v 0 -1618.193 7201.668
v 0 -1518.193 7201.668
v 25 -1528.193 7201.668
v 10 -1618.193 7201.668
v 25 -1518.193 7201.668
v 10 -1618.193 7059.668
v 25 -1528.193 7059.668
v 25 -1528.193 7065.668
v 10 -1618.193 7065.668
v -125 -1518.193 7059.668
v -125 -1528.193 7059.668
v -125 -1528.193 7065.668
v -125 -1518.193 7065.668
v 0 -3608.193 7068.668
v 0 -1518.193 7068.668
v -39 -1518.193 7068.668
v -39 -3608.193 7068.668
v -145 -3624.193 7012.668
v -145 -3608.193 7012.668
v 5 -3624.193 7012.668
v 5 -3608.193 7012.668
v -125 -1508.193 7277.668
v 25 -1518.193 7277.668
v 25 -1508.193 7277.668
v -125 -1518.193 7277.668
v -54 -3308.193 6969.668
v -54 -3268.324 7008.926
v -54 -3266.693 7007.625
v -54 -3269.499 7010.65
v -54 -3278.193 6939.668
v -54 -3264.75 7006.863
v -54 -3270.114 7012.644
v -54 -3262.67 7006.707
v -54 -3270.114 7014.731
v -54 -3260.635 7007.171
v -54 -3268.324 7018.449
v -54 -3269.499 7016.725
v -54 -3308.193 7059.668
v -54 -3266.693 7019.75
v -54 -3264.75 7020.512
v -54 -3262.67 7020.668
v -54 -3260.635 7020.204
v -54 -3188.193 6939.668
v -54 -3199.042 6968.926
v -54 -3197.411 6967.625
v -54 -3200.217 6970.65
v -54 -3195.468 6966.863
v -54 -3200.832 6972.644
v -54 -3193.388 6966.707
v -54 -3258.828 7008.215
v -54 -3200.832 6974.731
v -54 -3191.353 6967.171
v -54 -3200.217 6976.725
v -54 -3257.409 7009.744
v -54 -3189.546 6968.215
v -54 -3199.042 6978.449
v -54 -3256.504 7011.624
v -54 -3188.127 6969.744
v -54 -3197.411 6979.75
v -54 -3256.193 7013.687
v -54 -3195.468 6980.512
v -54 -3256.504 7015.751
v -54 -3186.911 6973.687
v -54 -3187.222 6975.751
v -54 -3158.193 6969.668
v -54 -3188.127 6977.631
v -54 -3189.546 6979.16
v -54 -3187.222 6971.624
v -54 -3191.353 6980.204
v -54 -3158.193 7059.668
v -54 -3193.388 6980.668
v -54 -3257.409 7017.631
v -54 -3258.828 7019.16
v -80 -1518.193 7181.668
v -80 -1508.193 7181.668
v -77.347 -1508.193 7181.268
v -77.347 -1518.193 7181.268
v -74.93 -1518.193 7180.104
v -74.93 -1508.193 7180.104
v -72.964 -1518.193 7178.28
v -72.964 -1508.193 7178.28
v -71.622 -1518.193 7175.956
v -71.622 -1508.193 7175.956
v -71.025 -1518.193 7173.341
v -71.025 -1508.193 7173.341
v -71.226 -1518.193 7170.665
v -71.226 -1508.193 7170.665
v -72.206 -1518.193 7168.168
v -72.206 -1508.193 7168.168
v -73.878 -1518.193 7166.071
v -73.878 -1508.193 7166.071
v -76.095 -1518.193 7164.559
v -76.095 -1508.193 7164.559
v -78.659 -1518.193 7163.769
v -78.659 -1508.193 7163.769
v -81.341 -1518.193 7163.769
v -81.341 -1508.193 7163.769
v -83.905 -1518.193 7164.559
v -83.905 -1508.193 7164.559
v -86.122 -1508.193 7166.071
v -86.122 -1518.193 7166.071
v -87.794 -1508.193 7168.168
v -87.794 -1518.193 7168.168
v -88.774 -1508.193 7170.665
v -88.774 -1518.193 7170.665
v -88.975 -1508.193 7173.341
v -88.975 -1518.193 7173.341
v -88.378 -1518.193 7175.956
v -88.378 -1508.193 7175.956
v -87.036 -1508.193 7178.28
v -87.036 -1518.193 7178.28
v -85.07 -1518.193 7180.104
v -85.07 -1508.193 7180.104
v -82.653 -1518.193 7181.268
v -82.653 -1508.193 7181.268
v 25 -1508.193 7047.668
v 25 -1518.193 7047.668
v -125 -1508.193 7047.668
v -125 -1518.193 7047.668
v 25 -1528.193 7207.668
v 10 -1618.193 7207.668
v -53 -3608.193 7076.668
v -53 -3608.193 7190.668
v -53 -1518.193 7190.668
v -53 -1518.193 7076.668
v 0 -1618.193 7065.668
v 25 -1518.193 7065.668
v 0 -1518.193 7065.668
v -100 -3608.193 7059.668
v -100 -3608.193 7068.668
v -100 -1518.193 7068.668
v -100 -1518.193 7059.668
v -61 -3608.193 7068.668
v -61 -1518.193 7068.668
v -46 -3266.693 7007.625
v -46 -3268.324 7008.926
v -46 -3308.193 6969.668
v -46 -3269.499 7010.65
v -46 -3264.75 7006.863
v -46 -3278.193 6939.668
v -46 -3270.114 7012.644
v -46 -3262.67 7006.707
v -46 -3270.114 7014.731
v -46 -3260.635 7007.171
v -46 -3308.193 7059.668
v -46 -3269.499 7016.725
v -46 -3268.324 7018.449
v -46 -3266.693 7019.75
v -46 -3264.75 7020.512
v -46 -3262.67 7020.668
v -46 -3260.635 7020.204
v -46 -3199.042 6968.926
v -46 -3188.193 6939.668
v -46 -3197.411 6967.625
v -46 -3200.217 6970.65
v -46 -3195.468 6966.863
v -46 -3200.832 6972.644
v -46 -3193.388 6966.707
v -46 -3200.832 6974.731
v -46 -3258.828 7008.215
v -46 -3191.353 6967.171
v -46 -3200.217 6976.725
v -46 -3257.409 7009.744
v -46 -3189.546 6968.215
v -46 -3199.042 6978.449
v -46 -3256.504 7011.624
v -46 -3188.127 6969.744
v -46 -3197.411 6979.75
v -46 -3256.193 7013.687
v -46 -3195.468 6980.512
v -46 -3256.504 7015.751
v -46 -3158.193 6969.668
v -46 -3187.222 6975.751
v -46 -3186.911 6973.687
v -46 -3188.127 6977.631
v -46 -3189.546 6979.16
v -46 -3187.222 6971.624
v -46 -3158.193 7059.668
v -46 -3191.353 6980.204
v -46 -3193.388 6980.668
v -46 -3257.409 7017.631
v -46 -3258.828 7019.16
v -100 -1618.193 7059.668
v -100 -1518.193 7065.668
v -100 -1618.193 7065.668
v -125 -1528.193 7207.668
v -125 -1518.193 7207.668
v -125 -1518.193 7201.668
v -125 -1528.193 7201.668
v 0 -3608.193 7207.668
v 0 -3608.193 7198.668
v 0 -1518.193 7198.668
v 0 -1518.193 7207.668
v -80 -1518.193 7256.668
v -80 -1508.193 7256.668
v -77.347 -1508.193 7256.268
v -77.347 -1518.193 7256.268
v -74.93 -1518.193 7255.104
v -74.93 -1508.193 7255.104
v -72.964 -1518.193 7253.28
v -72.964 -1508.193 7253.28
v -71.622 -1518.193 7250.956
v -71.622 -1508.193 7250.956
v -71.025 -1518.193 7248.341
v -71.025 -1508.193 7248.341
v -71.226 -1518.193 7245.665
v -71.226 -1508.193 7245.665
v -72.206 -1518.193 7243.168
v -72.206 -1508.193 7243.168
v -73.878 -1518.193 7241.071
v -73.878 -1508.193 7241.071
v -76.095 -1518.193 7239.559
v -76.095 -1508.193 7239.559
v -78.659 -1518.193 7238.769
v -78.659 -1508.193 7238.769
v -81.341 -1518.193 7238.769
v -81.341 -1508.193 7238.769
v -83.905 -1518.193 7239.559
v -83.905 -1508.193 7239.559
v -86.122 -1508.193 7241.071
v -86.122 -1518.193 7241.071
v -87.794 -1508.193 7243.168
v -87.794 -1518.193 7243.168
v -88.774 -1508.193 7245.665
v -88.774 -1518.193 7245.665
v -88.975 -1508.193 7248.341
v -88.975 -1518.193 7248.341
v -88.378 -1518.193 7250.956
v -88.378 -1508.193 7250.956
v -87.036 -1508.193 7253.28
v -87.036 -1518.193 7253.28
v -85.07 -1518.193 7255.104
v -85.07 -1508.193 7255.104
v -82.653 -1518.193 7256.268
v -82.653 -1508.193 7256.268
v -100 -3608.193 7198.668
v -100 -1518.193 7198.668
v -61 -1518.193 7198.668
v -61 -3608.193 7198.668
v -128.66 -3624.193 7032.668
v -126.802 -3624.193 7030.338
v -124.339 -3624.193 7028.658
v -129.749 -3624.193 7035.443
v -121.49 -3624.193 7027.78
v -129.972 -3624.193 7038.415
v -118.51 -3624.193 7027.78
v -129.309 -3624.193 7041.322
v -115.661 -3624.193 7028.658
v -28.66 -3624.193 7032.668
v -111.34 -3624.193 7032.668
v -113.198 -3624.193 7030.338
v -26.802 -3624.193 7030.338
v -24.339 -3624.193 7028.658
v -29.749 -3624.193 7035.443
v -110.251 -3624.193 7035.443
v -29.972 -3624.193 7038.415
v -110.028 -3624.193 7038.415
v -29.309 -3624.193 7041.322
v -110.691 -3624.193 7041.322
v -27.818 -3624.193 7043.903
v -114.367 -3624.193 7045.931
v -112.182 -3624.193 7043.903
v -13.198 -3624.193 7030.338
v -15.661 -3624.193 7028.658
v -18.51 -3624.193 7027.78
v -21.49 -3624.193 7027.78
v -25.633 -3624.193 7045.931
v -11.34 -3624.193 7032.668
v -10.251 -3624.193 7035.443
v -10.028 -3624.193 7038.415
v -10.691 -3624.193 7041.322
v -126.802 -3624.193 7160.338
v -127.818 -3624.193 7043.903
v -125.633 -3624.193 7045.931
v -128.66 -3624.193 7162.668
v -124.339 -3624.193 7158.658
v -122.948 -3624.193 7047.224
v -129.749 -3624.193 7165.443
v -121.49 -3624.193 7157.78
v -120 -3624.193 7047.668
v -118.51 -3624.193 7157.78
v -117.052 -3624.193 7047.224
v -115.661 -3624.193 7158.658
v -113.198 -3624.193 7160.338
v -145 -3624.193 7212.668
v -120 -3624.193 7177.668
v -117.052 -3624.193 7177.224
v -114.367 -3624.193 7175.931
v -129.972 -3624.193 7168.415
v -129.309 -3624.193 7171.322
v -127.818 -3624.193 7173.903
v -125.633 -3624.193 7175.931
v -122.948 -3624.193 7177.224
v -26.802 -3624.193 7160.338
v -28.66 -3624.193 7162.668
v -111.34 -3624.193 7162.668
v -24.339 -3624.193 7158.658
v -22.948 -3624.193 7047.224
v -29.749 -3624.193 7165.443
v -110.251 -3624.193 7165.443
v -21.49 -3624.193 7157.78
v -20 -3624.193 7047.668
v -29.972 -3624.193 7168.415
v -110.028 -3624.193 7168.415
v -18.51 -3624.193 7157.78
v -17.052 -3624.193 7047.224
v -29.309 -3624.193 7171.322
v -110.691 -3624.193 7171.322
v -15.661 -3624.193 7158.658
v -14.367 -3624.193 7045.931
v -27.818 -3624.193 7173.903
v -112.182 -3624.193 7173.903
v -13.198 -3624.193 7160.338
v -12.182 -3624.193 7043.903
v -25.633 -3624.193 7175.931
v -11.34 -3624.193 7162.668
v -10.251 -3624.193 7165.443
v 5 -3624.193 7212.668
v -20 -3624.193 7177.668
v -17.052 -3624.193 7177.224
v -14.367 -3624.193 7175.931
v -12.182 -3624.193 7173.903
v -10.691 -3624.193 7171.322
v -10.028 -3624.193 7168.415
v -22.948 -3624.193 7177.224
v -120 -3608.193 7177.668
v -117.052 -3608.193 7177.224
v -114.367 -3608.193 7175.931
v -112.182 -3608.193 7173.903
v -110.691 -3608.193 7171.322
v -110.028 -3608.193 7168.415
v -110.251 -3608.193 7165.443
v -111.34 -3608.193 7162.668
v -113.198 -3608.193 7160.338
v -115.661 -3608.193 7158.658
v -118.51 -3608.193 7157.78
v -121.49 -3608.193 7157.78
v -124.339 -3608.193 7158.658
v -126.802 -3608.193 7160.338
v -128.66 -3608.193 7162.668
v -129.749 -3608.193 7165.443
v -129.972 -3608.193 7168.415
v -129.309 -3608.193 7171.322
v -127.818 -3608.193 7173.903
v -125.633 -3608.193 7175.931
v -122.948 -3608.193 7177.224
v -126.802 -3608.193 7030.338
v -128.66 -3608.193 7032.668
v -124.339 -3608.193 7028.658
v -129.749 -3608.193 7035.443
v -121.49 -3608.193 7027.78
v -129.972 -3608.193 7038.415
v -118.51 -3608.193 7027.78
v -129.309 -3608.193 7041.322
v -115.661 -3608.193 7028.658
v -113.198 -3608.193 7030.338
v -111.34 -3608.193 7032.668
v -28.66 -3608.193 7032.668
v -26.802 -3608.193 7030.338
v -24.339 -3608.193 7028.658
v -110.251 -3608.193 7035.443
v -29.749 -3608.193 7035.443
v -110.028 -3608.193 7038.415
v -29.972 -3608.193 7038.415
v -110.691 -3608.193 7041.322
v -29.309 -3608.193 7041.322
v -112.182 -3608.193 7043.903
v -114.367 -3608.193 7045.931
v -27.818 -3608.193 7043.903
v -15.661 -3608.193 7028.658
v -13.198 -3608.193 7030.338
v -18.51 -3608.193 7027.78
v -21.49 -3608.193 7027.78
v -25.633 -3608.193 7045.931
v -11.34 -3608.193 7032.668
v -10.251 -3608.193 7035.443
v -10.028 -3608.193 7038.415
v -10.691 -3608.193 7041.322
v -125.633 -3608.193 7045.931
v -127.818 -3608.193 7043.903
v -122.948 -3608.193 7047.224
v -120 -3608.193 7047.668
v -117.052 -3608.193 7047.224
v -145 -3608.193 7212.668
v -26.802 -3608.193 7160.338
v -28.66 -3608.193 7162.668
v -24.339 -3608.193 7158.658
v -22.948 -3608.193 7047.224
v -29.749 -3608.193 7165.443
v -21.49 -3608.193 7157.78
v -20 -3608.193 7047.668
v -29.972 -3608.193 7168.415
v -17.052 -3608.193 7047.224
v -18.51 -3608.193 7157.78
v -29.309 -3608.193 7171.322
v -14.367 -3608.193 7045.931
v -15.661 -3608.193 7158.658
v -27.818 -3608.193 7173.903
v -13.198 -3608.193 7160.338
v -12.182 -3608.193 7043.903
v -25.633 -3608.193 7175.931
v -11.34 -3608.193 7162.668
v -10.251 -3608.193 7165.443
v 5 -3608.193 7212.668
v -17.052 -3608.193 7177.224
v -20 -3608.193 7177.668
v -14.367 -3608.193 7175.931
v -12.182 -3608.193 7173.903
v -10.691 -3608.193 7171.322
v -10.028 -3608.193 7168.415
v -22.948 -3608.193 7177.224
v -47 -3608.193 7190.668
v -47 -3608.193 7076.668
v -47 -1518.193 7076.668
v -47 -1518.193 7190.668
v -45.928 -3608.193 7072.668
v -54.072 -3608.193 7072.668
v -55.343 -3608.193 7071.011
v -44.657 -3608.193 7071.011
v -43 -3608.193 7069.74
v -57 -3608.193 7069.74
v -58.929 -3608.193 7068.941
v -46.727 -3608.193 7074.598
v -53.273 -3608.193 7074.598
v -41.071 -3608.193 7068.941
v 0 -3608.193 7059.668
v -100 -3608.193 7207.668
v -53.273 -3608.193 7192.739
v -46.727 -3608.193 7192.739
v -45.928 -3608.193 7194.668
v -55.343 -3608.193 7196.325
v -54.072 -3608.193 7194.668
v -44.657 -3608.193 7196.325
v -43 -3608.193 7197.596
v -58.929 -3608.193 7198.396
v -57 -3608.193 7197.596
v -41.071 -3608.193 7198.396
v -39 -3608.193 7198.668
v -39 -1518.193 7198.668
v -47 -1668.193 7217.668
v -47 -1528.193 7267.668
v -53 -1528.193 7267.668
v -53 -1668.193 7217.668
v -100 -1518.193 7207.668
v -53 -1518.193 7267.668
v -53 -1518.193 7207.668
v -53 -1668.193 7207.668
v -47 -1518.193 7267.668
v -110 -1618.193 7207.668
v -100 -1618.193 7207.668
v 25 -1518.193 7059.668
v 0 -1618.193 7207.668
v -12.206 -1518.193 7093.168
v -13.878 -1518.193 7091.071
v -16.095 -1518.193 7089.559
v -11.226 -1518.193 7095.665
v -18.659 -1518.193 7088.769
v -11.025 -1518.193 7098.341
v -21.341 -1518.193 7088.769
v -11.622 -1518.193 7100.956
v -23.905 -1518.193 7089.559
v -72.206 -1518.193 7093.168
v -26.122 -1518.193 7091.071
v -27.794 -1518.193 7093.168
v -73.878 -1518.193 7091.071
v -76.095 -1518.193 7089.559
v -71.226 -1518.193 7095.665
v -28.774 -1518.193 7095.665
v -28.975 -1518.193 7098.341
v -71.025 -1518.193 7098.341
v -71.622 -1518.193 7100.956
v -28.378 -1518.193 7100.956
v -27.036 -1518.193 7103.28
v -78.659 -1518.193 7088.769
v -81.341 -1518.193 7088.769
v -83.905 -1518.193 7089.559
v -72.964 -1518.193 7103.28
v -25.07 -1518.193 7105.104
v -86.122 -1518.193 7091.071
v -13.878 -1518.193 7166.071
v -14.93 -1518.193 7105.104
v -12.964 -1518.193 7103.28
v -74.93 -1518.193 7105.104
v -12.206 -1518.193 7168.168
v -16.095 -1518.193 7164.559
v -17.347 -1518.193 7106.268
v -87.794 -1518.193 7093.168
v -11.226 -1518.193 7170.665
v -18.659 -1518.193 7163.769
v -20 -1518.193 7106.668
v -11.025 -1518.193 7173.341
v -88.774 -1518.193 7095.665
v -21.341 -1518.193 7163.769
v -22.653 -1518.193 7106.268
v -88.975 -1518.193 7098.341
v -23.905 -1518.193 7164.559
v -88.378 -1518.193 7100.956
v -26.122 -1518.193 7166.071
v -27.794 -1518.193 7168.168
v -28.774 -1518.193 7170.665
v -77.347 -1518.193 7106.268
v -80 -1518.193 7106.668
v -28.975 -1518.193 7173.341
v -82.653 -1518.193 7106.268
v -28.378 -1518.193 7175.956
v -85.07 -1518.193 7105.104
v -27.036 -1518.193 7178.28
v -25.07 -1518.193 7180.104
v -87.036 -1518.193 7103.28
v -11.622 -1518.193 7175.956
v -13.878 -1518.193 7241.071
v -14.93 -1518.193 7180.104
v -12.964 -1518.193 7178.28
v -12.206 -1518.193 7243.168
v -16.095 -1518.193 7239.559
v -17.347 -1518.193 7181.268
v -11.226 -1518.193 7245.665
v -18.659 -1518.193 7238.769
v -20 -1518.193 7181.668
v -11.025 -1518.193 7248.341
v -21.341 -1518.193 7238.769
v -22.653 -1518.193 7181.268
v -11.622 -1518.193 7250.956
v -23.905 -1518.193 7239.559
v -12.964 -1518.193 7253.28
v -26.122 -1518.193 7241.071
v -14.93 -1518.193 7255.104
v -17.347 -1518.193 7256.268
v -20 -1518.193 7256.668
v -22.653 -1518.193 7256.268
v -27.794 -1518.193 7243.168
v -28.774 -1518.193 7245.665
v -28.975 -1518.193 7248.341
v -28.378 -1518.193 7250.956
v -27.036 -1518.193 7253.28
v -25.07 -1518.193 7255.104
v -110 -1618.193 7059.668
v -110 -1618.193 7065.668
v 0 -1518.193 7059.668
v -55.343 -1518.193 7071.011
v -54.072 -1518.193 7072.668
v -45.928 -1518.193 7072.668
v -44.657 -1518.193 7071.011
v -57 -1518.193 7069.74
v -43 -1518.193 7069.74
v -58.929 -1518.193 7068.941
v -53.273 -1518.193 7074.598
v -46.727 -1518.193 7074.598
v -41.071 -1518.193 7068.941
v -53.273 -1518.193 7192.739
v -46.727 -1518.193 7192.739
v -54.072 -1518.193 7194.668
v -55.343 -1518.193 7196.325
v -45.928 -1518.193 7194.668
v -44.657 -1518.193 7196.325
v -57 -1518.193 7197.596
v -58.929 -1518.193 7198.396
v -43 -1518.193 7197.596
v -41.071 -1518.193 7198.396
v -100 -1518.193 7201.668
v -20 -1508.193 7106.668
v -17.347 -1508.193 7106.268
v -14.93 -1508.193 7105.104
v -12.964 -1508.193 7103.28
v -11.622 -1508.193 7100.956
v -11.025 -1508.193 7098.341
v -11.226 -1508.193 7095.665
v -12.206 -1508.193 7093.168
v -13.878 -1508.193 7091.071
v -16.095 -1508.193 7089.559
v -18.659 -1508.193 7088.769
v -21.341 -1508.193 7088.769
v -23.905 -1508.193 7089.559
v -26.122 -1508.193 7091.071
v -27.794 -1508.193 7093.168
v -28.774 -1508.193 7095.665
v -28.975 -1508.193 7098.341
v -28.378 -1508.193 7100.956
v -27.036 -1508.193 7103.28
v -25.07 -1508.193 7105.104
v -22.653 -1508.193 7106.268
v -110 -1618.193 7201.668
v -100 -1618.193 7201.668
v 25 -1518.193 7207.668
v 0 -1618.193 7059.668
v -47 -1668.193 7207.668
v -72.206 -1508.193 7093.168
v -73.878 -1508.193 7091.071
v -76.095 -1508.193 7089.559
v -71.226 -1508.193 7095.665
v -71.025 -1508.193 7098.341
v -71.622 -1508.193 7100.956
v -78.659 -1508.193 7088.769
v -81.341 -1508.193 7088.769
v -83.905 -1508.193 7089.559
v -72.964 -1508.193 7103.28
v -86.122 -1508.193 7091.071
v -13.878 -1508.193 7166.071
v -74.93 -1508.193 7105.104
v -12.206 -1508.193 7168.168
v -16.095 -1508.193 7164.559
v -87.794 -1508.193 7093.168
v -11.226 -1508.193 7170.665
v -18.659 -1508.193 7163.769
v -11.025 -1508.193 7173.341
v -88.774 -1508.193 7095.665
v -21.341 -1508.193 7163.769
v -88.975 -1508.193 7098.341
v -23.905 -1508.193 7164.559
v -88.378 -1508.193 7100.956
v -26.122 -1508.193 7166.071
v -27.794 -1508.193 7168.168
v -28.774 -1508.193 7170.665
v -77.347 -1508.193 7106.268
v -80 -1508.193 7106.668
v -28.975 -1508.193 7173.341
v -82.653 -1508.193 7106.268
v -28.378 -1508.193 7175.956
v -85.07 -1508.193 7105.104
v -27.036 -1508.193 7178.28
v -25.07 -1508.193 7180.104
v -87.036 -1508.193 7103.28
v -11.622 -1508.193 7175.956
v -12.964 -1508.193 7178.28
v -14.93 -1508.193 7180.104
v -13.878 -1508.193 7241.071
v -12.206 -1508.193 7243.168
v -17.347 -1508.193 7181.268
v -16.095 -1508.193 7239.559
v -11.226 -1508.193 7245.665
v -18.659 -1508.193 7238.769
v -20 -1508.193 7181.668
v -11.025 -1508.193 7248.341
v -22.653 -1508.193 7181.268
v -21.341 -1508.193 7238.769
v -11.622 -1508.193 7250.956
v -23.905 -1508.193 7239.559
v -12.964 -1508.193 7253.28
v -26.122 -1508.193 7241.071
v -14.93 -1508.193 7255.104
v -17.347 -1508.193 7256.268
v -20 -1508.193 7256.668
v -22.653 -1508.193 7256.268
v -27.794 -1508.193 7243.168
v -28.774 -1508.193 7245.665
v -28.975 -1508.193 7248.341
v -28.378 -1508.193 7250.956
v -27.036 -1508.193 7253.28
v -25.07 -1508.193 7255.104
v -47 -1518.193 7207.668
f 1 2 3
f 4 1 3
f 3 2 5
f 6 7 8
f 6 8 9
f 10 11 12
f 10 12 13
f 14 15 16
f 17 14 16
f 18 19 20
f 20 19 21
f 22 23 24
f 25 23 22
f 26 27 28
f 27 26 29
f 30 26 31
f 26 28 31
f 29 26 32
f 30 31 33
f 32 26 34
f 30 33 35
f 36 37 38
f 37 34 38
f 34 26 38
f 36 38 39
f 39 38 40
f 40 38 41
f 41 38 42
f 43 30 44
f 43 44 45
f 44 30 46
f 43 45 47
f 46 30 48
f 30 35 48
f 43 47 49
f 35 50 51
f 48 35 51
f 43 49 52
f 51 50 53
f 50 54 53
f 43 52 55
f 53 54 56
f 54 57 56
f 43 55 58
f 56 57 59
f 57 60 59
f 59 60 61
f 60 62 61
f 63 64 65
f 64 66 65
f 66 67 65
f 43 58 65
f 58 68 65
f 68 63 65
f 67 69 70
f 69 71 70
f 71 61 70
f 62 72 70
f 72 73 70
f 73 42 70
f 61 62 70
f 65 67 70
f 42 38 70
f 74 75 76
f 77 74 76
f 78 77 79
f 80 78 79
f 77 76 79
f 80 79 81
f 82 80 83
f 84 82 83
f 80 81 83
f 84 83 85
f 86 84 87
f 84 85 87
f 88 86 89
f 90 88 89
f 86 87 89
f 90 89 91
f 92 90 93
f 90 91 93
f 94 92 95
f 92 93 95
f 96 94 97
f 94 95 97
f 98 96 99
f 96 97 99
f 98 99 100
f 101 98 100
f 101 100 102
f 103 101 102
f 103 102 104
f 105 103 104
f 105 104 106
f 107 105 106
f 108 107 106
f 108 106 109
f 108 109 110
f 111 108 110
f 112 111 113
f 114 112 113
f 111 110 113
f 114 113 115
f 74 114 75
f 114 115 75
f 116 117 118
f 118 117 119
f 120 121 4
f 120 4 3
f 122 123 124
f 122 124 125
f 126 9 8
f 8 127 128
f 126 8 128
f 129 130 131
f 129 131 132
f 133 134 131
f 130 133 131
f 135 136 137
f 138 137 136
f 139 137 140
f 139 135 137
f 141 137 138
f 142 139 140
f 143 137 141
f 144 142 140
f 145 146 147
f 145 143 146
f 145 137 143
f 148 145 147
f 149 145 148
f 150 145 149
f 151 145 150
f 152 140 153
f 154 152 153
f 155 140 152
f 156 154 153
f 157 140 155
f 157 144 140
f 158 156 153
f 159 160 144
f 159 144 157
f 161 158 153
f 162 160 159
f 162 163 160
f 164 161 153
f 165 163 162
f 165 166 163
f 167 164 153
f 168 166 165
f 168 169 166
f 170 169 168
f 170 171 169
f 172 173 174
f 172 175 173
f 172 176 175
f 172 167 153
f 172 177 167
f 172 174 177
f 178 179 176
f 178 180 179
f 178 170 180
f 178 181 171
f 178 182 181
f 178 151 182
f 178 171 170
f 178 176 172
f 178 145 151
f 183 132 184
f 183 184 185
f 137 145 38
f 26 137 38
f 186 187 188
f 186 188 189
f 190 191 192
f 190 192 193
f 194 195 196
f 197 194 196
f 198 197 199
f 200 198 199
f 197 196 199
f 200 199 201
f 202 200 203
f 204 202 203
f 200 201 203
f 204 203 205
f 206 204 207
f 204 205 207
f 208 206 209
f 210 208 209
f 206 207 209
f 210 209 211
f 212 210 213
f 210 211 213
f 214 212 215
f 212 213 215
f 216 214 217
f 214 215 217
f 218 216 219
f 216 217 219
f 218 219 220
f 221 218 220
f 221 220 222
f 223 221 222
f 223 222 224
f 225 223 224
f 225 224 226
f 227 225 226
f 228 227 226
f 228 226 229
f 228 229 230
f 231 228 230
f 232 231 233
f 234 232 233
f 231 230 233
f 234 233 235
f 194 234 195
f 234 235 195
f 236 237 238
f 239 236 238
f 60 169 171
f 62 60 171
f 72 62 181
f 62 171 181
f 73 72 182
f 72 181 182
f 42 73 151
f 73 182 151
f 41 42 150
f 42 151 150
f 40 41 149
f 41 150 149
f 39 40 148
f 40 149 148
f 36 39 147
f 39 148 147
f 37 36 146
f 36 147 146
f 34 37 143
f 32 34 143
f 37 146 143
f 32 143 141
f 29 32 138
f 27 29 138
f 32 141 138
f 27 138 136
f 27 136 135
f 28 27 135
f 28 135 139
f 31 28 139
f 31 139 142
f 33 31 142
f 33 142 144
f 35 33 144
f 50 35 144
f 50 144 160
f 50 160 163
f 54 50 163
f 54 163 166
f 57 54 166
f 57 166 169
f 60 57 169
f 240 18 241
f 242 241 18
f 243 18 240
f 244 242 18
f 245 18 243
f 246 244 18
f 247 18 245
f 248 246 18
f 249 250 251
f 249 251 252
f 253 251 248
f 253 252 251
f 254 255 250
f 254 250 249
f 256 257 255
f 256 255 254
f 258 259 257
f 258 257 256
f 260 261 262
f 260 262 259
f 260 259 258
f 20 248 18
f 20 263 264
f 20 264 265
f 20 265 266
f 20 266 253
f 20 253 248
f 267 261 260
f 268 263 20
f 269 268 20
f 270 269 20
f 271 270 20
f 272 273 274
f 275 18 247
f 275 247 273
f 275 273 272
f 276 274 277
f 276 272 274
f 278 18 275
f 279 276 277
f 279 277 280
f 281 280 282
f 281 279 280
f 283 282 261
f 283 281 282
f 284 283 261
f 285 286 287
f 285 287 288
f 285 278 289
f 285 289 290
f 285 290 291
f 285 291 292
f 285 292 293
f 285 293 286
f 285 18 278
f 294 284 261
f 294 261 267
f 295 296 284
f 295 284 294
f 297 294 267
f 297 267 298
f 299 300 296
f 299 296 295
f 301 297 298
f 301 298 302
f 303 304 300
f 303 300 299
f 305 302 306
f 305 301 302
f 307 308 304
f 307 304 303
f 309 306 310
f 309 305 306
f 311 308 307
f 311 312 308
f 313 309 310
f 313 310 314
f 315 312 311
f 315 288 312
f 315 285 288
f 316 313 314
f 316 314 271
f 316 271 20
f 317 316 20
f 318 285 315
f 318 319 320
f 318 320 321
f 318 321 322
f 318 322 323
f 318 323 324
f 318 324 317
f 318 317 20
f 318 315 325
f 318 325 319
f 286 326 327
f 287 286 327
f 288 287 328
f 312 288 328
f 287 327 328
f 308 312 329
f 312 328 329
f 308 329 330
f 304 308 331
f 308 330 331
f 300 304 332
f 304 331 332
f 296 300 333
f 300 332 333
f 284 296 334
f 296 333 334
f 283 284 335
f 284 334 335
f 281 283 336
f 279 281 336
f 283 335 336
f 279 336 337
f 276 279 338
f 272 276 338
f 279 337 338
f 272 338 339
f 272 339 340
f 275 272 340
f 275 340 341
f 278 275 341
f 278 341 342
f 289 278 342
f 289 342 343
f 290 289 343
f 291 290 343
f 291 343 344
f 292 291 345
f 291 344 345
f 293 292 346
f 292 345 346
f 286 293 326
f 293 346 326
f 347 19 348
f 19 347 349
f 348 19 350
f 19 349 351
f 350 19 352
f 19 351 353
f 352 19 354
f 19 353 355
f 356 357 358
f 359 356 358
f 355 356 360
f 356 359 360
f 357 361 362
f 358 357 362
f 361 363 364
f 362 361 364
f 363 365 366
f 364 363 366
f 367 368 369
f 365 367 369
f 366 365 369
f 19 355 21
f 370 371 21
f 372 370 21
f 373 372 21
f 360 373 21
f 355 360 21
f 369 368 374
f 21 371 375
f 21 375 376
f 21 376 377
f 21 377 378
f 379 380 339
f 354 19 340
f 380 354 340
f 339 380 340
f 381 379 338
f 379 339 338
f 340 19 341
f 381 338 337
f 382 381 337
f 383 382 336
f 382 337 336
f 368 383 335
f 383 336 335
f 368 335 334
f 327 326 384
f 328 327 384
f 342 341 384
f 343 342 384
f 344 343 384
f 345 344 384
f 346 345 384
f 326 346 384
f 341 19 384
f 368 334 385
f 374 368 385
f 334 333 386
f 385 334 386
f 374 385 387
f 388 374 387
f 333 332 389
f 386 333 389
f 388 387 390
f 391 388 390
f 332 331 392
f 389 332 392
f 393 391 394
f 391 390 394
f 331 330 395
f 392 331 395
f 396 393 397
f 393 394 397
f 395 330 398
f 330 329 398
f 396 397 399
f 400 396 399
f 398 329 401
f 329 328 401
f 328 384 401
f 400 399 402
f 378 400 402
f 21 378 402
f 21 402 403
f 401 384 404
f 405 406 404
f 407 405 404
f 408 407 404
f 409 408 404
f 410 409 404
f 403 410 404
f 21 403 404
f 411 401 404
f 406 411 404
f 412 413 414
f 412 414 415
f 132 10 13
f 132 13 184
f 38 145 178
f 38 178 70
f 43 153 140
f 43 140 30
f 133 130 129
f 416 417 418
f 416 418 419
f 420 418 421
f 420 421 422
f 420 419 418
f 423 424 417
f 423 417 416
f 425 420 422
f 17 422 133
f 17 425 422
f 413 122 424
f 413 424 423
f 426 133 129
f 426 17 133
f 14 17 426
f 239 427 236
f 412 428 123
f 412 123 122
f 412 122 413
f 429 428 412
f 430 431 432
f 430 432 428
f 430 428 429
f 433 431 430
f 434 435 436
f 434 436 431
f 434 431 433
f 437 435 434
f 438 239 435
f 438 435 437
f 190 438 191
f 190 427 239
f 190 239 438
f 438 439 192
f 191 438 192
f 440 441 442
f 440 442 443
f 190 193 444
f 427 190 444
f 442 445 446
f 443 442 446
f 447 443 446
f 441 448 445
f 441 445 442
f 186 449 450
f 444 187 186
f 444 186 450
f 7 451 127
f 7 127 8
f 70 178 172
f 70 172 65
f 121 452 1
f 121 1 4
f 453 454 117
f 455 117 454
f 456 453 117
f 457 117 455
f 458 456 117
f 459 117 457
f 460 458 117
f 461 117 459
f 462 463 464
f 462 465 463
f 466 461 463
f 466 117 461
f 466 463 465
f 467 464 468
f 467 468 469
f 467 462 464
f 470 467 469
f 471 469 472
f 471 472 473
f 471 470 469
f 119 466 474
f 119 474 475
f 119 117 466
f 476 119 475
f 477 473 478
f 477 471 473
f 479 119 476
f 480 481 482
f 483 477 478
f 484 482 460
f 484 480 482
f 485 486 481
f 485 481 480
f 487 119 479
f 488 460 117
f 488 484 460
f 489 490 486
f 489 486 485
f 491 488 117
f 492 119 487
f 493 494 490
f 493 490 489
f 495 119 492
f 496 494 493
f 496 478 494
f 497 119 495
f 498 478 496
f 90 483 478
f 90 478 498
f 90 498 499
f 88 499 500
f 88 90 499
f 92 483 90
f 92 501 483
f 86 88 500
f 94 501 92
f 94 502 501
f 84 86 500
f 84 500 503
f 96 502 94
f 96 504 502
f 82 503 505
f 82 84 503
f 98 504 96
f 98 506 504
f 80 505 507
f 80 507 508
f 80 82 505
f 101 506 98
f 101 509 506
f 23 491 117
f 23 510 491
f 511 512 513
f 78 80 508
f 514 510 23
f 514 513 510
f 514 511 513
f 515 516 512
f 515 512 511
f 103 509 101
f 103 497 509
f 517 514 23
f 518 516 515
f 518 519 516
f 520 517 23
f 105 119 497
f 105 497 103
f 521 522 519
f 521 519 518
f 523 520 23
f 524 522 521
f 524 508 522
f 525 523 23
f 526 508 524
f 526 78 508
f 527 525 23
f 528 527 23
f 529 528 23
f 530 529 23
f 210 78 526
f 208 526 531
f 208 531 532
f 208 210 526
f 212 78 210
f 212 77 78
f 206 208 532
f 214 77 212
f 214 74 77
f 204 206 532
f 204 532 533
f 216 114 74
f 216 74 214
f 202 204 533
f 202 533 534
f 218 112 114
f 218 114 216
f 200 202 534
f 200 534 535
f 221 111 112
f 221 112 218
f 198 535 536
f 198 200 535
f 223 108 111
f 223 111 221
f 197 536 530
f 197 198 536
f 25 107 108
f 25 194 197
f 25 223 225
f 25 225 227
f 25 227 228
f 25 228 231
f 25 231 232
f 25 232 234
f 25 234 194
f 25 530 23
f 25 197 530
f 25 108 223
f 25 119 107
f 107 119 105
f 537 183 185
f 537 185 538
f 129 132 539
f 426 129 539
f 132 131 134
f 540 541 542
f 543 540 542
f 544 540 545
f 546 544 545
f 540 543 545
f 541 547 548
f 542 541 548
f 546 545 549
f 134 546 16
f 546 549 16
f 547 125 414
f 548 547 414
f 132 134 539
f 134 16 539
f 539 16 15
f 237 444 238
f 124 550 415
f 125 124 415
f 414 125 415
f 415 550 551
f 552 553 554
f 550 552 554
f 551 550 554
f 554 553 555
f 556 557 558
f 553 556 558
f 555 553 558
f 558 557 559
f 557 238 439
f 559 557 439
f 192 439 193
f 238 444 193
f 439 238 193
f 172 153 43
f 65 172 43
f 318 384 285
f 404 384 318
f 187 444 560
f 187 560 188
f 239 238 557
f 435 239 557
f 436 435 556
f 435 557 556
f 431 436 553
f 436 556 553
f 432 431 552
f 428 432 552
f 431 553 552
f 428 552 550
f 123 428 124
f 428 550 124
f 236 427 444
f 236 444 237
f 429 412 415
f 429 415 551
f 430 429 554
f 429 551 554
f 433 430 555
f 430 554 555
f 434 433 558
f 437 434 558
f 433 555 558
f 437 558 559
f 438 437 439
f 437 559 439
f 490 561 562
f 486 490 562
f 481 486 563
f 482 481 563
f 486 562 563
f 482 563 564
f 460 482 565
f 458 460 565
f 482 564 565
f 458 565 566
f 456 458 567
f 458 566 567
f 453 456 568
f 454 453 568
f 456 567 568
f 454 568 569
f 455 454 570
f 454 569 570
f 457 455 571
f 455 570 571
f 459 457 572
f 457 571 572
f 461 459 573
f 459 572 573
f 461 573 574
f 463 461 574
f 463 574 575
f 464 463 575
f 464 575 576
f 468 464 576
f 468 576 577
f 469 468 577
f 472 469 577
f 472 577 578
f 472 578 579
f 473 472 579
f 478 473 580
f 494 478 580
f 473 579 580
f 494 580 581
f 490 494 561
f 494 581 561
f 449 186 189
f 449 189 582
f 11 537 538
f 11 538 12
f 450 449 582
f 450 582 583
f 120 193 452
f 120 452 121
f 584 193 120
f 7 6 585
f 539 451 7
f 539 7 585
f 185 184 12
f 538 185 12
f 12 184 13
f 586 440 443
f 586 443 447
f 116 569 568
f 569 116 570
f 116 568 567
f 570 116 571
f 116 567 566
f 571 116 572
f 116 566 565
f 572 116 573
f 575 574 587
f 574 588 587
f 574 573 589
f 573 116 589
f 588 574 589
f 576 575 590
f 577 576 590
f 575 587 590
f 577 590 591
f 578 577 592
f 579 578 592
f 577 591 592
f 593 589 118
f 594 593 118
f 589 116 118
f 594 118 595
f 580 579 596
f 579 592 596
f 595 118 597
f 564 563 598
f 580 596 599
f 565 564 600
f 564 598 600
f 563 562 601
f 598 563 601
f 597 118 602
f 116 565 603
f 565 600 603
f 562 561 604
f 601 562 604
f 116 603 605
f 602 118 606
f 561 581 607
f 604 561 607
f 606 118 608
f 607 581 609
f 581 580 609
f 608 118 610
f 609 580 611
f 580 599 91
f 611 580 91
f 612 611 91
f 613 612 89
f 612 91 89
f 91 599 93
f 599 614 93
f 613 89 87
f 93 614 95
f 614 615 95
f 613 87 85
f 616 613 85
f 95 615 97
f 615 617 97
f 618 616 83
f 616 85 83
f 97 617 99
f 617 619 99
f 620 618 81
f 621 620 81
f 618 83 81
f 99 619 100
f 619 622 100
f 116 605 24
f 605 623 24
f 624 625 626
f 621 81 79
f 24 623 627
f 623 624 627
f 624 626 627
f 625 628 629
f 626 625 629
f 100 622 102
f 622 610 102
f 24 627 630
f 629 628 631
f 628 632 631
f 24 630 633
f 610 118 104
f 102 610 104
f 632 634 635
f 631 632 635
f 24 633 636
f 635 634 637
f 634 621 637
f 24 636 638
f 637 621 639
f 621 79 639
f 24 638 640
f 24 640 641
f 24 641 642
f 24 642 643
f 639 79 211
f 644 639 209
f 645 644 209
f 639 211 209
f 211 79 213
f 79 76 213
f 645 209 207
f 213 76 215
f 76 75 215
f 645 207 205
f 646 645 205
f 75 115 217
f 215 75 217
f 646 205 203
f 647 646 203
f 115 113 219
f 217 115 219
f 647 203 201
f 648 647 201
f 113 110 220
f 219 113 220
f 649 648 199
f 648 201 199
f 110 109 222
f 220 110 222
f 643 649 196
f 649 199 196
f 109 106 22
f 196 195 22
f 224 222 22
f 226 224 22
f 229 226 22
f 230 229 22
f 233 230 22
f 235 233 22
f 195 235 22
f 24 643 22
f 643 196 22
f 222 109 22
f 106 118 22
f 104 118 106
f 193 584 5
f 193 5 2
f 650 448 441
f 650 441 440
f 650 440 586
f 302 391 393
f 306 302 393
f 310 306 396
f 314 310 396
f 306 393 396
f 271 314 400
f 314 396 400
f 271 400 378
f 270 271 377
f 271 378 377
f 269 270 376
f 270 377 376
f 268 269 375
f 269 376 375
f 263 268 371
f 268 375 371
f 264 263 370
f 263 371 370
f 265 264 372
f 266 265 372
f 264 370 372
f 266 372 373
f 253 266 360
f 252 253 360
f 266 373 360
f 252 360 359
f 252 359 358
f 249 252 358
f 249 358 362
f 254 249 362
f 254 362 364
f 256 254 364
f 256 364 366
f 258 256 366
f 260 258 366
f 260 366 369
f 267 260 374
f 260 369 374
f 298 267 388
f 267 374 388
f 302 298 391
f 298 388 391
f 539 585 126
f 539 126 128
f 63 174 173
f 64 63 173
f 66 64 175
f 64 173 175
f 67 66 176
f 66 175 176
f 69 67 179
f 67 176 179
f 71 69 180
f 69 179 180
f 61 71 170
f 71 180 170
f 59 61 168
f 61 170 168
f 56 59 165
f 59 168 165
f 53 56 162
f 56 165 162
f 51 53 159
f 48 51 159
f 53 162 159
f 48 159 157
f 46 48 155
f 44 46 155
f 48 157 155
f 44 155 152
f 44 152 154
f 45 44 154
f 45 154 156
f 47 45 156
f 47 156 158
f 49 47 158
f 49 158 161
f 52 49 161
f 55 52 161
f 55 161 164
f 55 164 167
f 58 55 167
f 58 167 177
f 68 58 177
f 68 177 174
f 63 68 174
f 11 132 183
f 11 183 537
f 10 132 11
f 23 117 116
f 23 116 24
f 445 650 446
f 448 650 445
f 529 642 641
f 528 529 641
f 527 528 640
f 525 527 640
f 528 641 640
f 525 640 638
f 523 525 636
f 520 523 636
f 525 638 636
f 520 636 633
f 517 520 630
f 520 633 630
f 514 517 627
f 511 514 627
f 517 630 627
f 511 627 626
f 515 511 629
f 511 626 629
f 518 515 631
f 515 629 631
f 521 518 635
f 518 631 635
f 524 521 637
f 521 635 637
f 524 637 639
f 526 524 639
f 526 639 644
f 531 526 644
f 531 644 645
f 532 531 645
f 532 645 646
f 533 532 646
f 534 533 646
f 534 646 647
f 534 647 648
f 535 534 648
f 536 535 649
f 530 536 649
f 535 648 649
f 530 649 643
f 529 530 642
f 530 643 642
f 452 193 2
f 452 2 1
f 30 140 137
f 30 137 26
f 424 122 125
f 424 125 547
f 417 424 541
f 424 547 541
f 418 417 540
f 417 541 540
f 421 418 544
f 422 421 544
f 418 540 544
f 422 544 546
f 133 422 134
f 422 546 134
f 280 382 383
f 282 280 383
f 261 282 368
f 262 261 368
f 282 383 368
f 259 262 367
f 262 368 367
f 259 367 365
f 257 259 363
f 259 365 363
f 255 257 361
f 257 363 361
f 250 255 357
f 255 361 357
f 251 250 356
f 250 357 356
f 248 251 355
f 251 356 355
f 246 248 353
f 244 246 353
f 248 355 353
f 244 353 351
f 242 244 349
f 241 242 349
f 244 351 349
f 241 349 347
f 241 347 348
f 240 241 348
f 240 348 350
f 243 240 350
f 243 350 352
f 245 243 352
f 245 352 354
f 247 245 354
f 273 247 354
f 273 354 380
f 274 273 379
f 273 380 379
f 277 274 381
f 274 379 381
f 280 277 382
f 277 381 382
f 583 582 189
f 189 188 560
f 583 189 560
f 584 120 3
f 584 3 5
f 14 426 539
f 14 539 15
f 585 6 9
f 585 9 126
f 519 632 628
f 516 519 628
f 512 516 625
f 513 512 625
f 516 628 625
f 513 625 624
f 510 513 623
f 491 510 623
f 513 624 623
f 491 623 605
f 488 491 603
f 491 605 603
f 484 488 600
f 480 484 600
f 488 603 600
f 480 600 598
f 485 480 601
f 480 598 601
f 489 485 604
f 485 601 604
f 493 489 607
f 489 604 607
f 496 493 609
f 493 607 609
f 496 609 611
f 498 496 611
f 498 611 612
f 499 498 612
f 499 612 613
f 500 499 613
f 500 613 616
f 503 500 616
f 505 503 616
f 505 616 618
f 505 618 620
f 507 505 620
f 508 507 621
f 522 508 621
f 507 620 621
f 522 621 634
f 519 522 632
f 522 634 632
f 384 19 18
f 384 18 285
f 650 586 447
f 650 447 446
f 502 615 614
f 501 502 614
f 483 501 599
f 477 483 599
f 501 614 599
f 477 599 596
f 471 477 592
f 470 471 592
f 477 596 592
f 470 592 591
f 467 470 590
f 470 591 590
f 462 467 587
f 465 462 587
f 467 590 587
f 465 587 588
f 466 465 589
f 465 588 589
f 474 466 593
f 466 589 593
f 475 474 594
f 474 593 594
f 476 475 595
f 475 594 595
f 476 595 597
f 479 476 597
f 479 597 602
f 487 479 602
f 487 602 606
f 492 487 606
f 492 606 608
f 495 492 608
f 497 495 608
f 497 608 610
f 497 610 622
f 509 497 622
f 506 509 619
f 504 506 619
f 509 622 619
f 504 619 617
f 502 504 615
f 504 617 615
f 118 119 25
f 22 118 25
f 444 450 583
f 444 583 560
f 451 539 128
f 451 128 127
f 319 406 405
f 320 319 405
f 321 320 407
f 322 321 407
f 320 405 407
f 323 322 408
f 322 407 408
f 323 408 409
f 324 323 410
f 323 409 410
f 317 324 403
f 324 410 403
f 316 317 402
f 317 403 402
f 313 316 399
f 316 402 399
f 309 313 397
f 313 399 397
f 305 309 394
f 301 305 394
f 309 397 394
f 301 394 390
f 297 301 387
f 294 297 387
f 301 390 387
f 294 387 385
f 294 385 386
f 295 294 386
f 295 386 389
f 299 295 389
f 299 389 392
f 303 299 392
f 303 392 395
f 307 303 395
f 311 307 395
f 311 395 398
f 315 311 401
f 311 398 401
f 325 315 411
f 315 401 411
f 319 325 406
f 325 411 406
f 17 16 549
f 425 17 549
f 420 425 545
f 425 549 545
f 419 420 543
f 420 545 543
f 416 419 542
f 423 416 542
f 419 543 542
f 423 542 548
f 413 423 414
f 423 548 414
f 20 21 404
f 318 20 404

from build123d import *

# Parameters (mm, degrees)
H_HM150_100_1_DEPTH = 2090
SKETCH_12_W         = 150
SKETCH_12_H         = 200
EXTRUDE_1_DEPTH     = 16
SKETCH_13_W         = 230
SKETCH_13_H         = 150
EXTRUDE_2_DEPTH     = 10
SKETCH_15_R         = 9
CUT_EXTRUDE_2_DEPTH = 10
EXTRUDE_3_DEPTH     = 6
EXTRUDE_3_2_DEPTH   = 6
EXTRUDE_4_DEPTH     = 6
EXTRUDE_4_2_DEPTH   = 6
EXTRUDE_5_DEPTH     = 6
SKETCH_19_W         = 8
SKETCH_19_H         = 150
EXTRUDE_6_DEPTH     = 120
SKETCH_23_R         = 10
CUT_EXTRUDE_5_DEPTH = 16
CHAMFER_1_SIZE      = 30
SKETCH_20_R         = 7
CUT_EXTRUDE_3_DEPTH = 120


with BuildPart() as part:
    # 草图11 → H型钢 HM150×100(1) (new body)
    with BuildSketch(Plane(origin=(-50, -1518.192662688, 7133.668163116), x_dir=(1, 0, 0), z_dir=(0, -1, 0))):
        with BuildLine():
            Line((-50, -74), (50, -74))
            Line((50, -74), (50, -65))
            Line((50, -65), (11, -65))
            ThreePointArc((11, -65), (5.343145751, -62.656854249), (3, -57))
            Line((3, -57), (3, 57))
            ThreePointArc((3, 57), (5.343145751, 62.656854249), (11, 65))
            Line((11, 65), (50, 65))
            Line((50, 65), (50, 74))
            Line((50, 74), (-50, 74))
            Line((-50, 74), (-50, 65))
            Line((-50, 65), (-11, 65))
            ThreePointArc((-11, 65), (-5.343145751, 62.656854249), (-3, 57))
            Line((-3, 57), (-3, -57))
            ThreePointArc((-3, -57), (-5.343145751, -62.656854249), (-11, -65))
            Line((-11, -65), (-50, -65))
            Line((-50, -65), (-50, -74))
        make_face()
    extrude(amount=H_HM150_100_1_DEPTH)


with BuildPart() as body_2:
    # 草图12 → 凸台-拉伸1 (new body)
    with BuildSketch(Plane.XZ.offset(3608.192662688)):
        with Locations((-70, 7112.668163116)):
            Rectangle(SKETCH_12_W, SKETCH_12_H)
    extrude(amount=EXTRUDE_1_DEPTH)

    # 草图23 → 切除-拉伸5 (cut)
    with BuildSketch(Plane(origin=(0, -3608.192662688, 0), x_dir=(1, 0, 0), z_dir=(0, 1, 0))):
        with Locations(Location((-120, -7037.668163116, 0), (0, 0, 270))):
            Circle(SKETCH_23_R)
        with Locations(Location((-120, -7167.668163116, 0), (0, 0, 270))):
            Circle(SKETCH_23_R)
        with Locations(Location((-20, -7037.668163116, 0), (0, 0, 270))):
            Circle(SKETCH_23_R)
        with Locations(Location((-20, -7167.668163116, 0), (0, 0, 270))):
            Circle(SKETCH_23_R)
    extrude(amount=-CUT_EXTRUDE_5_DEPTH, mode=Mode.SUBTRACT)


with BuildPart() as body_3:
    # 草图13 → 凸台-拉伸2 (new body)
    with BuildSketch(Plane(origin=(-1618.192662688, -1518.192662688, 0), x_dir=(0, 0, 1), z_dir=(0, -1, 0))):
        with Locations((7162.668163116, -1568.192662688)):
            Rectangle(SKETCH_13_W, SKETCH_13_H)
    extrude(amount=-EXTRUDE_2_DEPTH)

    # 草图15 → 切除-拉伸2 (cut)
    with BuildSketch(Plane(origin=(1383.192662688, -1508.192662688, 0), x_dir=(1, 0, 0), z_dir=(0, 1, 0))):
        with Locations(Location((-1403.192662688, -7247.668163116, 0), (0, 0, 270))):
            Circle(SKETCH_15_R)
        with Locations(Location((-1463.192662688, -7247.668163116, 0), (0, 0, 270))):
            Circle(SKETCH_15_R)
        with Locations(Location((-1463.192662688, -7172.668163116, 0), (0, 0, 270))):
            Circle(SKETCH_15_R)
        with Locations(Location((-1403.192662688, -7172.668163116, 0), (0, 0, 270))):
            Circle(SKETCH_15_R)
        with Locations(Location((-1403.192662688, -7097.668163116, 0), (0, 0, 270))):
            Circle(SKETCH_15_R)
        with Locations(Location((-1463.192662688, -7097.668163116, 0), (0, 0, 270))):
            Circle(SKETCH_15_R)
    extrude(amount=-CUT_EXTRUDE_2_DEPTH, mode=Mode.SUBTRACT)


with BuildPart() as body_4:
    # 草图16 → 凸台-拉伸3 (new body)
    with BuildSketch(Plane.XY.offset(7207.668163116)):
        Polygon((-125, -1518.192662688), (-125, -1528.192662688), (-110, -1618.192662688), (-100, -1618.192662688), (-100, -1518.192662688), align=None)
    extrude(amount=-EXTRUDE_3_DEPTH)


with BuildPart() as body_5:
    # 草图16 → Extrude 3 2 (new body)
    with BuildSketch(Plane.XY.offset(7207.668163116)):
        Polygon((25, -1518.192662688), (0, -1518.192662688), (0, -1618.192662688), (10, -1618.192662688), (25, -1528.192662688), align=None)
    extrude(amount=-EXTRUDE_3_2_DEPTH)


with BuildPart() as body_6:
    # 草图17 → 凸台-拉伸4 (new body)
    with BuildSketch(Plane(origin=(0, 0, 7059.668163116), x_dir=(-1, 0, 0), z_dir=(0, 0, -1))):
        Polygon((-25, -1518.192662688), (-25, -1528.192662688), (-10, -1618.192662688), (0, -1618.192662688), (0, -1518.192662688), align=None)
    extrude(amount=-EXTRUDE_4_DEPTH)


with BuildPart() as body_7:
    # 草图17 → Extrude 4 2 (new body)
    with BuildSketch(Plane(origin=(0, 0, 7059.668163116), x_dir=(-1, 0, 0), z_dir=(0, 0, -1))):
        Polygon((125, -1518.192662688), (100, -1518.192662688), (100, -1618.192662688), (110, -1618.192662688), (125, -1528.192662688), align=None)
    extrude(amount=-EXTRUDE_4_2_DEPTH)


with BuildPart() as body_8:
    # 草图18 → 凸台-拉伸5 (new body)
    with BuildSketch(Plane(origin=(-47, 0, 0), x_dir=(0, 0, -1), z_dir=(1, 0, 0))):
        Polygon((-7207.668163116, -1518.192662688), (-7267.668163116, -1518.192662688), (-7267.668163116, -1528.192662688), (-7217.668163116, -1668.192662688), (-7207.668163116, -1668.192662688), align=None)
    extrude(amount=-EXTRUDE_5_DEPTH)


with BuildPart() as body_9:
    # 草图19 → 凸台-拉伸6 (new body)
    with BuildSketch(Plane(origin=(0, 0, 7059.668163116), x_dir=(-1, 0, 0), z_dir=(0, 0, -1))):
        with Locations((50, -3233.192662688)):
            Rectangle(SKETCH_19_W, SKETCH_19_H)
    extrude(amount=EXTRUDE_6_DEPTH)

    # 倒角1
    chamfer_1_edges = [body_9.edges().sort_by_distance(p)[0] for p in [
        (-50, -3158.192662688, 6939.668163116),
        (-50, -3308.192662688, 6939.668163116),
    ]]
    chamfer(chamfer_1_edges, length=CHAMFER_1_SIZE)

    # 草图20 → 切除-拉伸3 (cut)
    with BuildSketch(Plane(origin=(-46, 0, 0), x_dir=(0, 0, -1), z_dir=(1, 0, 0))):
        with Locations(Location((-7013.687401002, -3263.192662688, 0), (0, 0, 90))):
            Circle(SKETCH_20_R)
        with Locations(Location((-6973.687401002, -3193.910630386, 0), (0, 0, 90))):
            Circle(SKETCH_20_R)
    extrude(amount=-CUT_EXTRUDE_3_DEPTH, mode=Mode.SUBTRACT)


solid = Compound([part.part, body_2.part, body_3.part, body_4.part, body_5.part, body_6.part, body_7.part, body_8.part, body_9.part])
